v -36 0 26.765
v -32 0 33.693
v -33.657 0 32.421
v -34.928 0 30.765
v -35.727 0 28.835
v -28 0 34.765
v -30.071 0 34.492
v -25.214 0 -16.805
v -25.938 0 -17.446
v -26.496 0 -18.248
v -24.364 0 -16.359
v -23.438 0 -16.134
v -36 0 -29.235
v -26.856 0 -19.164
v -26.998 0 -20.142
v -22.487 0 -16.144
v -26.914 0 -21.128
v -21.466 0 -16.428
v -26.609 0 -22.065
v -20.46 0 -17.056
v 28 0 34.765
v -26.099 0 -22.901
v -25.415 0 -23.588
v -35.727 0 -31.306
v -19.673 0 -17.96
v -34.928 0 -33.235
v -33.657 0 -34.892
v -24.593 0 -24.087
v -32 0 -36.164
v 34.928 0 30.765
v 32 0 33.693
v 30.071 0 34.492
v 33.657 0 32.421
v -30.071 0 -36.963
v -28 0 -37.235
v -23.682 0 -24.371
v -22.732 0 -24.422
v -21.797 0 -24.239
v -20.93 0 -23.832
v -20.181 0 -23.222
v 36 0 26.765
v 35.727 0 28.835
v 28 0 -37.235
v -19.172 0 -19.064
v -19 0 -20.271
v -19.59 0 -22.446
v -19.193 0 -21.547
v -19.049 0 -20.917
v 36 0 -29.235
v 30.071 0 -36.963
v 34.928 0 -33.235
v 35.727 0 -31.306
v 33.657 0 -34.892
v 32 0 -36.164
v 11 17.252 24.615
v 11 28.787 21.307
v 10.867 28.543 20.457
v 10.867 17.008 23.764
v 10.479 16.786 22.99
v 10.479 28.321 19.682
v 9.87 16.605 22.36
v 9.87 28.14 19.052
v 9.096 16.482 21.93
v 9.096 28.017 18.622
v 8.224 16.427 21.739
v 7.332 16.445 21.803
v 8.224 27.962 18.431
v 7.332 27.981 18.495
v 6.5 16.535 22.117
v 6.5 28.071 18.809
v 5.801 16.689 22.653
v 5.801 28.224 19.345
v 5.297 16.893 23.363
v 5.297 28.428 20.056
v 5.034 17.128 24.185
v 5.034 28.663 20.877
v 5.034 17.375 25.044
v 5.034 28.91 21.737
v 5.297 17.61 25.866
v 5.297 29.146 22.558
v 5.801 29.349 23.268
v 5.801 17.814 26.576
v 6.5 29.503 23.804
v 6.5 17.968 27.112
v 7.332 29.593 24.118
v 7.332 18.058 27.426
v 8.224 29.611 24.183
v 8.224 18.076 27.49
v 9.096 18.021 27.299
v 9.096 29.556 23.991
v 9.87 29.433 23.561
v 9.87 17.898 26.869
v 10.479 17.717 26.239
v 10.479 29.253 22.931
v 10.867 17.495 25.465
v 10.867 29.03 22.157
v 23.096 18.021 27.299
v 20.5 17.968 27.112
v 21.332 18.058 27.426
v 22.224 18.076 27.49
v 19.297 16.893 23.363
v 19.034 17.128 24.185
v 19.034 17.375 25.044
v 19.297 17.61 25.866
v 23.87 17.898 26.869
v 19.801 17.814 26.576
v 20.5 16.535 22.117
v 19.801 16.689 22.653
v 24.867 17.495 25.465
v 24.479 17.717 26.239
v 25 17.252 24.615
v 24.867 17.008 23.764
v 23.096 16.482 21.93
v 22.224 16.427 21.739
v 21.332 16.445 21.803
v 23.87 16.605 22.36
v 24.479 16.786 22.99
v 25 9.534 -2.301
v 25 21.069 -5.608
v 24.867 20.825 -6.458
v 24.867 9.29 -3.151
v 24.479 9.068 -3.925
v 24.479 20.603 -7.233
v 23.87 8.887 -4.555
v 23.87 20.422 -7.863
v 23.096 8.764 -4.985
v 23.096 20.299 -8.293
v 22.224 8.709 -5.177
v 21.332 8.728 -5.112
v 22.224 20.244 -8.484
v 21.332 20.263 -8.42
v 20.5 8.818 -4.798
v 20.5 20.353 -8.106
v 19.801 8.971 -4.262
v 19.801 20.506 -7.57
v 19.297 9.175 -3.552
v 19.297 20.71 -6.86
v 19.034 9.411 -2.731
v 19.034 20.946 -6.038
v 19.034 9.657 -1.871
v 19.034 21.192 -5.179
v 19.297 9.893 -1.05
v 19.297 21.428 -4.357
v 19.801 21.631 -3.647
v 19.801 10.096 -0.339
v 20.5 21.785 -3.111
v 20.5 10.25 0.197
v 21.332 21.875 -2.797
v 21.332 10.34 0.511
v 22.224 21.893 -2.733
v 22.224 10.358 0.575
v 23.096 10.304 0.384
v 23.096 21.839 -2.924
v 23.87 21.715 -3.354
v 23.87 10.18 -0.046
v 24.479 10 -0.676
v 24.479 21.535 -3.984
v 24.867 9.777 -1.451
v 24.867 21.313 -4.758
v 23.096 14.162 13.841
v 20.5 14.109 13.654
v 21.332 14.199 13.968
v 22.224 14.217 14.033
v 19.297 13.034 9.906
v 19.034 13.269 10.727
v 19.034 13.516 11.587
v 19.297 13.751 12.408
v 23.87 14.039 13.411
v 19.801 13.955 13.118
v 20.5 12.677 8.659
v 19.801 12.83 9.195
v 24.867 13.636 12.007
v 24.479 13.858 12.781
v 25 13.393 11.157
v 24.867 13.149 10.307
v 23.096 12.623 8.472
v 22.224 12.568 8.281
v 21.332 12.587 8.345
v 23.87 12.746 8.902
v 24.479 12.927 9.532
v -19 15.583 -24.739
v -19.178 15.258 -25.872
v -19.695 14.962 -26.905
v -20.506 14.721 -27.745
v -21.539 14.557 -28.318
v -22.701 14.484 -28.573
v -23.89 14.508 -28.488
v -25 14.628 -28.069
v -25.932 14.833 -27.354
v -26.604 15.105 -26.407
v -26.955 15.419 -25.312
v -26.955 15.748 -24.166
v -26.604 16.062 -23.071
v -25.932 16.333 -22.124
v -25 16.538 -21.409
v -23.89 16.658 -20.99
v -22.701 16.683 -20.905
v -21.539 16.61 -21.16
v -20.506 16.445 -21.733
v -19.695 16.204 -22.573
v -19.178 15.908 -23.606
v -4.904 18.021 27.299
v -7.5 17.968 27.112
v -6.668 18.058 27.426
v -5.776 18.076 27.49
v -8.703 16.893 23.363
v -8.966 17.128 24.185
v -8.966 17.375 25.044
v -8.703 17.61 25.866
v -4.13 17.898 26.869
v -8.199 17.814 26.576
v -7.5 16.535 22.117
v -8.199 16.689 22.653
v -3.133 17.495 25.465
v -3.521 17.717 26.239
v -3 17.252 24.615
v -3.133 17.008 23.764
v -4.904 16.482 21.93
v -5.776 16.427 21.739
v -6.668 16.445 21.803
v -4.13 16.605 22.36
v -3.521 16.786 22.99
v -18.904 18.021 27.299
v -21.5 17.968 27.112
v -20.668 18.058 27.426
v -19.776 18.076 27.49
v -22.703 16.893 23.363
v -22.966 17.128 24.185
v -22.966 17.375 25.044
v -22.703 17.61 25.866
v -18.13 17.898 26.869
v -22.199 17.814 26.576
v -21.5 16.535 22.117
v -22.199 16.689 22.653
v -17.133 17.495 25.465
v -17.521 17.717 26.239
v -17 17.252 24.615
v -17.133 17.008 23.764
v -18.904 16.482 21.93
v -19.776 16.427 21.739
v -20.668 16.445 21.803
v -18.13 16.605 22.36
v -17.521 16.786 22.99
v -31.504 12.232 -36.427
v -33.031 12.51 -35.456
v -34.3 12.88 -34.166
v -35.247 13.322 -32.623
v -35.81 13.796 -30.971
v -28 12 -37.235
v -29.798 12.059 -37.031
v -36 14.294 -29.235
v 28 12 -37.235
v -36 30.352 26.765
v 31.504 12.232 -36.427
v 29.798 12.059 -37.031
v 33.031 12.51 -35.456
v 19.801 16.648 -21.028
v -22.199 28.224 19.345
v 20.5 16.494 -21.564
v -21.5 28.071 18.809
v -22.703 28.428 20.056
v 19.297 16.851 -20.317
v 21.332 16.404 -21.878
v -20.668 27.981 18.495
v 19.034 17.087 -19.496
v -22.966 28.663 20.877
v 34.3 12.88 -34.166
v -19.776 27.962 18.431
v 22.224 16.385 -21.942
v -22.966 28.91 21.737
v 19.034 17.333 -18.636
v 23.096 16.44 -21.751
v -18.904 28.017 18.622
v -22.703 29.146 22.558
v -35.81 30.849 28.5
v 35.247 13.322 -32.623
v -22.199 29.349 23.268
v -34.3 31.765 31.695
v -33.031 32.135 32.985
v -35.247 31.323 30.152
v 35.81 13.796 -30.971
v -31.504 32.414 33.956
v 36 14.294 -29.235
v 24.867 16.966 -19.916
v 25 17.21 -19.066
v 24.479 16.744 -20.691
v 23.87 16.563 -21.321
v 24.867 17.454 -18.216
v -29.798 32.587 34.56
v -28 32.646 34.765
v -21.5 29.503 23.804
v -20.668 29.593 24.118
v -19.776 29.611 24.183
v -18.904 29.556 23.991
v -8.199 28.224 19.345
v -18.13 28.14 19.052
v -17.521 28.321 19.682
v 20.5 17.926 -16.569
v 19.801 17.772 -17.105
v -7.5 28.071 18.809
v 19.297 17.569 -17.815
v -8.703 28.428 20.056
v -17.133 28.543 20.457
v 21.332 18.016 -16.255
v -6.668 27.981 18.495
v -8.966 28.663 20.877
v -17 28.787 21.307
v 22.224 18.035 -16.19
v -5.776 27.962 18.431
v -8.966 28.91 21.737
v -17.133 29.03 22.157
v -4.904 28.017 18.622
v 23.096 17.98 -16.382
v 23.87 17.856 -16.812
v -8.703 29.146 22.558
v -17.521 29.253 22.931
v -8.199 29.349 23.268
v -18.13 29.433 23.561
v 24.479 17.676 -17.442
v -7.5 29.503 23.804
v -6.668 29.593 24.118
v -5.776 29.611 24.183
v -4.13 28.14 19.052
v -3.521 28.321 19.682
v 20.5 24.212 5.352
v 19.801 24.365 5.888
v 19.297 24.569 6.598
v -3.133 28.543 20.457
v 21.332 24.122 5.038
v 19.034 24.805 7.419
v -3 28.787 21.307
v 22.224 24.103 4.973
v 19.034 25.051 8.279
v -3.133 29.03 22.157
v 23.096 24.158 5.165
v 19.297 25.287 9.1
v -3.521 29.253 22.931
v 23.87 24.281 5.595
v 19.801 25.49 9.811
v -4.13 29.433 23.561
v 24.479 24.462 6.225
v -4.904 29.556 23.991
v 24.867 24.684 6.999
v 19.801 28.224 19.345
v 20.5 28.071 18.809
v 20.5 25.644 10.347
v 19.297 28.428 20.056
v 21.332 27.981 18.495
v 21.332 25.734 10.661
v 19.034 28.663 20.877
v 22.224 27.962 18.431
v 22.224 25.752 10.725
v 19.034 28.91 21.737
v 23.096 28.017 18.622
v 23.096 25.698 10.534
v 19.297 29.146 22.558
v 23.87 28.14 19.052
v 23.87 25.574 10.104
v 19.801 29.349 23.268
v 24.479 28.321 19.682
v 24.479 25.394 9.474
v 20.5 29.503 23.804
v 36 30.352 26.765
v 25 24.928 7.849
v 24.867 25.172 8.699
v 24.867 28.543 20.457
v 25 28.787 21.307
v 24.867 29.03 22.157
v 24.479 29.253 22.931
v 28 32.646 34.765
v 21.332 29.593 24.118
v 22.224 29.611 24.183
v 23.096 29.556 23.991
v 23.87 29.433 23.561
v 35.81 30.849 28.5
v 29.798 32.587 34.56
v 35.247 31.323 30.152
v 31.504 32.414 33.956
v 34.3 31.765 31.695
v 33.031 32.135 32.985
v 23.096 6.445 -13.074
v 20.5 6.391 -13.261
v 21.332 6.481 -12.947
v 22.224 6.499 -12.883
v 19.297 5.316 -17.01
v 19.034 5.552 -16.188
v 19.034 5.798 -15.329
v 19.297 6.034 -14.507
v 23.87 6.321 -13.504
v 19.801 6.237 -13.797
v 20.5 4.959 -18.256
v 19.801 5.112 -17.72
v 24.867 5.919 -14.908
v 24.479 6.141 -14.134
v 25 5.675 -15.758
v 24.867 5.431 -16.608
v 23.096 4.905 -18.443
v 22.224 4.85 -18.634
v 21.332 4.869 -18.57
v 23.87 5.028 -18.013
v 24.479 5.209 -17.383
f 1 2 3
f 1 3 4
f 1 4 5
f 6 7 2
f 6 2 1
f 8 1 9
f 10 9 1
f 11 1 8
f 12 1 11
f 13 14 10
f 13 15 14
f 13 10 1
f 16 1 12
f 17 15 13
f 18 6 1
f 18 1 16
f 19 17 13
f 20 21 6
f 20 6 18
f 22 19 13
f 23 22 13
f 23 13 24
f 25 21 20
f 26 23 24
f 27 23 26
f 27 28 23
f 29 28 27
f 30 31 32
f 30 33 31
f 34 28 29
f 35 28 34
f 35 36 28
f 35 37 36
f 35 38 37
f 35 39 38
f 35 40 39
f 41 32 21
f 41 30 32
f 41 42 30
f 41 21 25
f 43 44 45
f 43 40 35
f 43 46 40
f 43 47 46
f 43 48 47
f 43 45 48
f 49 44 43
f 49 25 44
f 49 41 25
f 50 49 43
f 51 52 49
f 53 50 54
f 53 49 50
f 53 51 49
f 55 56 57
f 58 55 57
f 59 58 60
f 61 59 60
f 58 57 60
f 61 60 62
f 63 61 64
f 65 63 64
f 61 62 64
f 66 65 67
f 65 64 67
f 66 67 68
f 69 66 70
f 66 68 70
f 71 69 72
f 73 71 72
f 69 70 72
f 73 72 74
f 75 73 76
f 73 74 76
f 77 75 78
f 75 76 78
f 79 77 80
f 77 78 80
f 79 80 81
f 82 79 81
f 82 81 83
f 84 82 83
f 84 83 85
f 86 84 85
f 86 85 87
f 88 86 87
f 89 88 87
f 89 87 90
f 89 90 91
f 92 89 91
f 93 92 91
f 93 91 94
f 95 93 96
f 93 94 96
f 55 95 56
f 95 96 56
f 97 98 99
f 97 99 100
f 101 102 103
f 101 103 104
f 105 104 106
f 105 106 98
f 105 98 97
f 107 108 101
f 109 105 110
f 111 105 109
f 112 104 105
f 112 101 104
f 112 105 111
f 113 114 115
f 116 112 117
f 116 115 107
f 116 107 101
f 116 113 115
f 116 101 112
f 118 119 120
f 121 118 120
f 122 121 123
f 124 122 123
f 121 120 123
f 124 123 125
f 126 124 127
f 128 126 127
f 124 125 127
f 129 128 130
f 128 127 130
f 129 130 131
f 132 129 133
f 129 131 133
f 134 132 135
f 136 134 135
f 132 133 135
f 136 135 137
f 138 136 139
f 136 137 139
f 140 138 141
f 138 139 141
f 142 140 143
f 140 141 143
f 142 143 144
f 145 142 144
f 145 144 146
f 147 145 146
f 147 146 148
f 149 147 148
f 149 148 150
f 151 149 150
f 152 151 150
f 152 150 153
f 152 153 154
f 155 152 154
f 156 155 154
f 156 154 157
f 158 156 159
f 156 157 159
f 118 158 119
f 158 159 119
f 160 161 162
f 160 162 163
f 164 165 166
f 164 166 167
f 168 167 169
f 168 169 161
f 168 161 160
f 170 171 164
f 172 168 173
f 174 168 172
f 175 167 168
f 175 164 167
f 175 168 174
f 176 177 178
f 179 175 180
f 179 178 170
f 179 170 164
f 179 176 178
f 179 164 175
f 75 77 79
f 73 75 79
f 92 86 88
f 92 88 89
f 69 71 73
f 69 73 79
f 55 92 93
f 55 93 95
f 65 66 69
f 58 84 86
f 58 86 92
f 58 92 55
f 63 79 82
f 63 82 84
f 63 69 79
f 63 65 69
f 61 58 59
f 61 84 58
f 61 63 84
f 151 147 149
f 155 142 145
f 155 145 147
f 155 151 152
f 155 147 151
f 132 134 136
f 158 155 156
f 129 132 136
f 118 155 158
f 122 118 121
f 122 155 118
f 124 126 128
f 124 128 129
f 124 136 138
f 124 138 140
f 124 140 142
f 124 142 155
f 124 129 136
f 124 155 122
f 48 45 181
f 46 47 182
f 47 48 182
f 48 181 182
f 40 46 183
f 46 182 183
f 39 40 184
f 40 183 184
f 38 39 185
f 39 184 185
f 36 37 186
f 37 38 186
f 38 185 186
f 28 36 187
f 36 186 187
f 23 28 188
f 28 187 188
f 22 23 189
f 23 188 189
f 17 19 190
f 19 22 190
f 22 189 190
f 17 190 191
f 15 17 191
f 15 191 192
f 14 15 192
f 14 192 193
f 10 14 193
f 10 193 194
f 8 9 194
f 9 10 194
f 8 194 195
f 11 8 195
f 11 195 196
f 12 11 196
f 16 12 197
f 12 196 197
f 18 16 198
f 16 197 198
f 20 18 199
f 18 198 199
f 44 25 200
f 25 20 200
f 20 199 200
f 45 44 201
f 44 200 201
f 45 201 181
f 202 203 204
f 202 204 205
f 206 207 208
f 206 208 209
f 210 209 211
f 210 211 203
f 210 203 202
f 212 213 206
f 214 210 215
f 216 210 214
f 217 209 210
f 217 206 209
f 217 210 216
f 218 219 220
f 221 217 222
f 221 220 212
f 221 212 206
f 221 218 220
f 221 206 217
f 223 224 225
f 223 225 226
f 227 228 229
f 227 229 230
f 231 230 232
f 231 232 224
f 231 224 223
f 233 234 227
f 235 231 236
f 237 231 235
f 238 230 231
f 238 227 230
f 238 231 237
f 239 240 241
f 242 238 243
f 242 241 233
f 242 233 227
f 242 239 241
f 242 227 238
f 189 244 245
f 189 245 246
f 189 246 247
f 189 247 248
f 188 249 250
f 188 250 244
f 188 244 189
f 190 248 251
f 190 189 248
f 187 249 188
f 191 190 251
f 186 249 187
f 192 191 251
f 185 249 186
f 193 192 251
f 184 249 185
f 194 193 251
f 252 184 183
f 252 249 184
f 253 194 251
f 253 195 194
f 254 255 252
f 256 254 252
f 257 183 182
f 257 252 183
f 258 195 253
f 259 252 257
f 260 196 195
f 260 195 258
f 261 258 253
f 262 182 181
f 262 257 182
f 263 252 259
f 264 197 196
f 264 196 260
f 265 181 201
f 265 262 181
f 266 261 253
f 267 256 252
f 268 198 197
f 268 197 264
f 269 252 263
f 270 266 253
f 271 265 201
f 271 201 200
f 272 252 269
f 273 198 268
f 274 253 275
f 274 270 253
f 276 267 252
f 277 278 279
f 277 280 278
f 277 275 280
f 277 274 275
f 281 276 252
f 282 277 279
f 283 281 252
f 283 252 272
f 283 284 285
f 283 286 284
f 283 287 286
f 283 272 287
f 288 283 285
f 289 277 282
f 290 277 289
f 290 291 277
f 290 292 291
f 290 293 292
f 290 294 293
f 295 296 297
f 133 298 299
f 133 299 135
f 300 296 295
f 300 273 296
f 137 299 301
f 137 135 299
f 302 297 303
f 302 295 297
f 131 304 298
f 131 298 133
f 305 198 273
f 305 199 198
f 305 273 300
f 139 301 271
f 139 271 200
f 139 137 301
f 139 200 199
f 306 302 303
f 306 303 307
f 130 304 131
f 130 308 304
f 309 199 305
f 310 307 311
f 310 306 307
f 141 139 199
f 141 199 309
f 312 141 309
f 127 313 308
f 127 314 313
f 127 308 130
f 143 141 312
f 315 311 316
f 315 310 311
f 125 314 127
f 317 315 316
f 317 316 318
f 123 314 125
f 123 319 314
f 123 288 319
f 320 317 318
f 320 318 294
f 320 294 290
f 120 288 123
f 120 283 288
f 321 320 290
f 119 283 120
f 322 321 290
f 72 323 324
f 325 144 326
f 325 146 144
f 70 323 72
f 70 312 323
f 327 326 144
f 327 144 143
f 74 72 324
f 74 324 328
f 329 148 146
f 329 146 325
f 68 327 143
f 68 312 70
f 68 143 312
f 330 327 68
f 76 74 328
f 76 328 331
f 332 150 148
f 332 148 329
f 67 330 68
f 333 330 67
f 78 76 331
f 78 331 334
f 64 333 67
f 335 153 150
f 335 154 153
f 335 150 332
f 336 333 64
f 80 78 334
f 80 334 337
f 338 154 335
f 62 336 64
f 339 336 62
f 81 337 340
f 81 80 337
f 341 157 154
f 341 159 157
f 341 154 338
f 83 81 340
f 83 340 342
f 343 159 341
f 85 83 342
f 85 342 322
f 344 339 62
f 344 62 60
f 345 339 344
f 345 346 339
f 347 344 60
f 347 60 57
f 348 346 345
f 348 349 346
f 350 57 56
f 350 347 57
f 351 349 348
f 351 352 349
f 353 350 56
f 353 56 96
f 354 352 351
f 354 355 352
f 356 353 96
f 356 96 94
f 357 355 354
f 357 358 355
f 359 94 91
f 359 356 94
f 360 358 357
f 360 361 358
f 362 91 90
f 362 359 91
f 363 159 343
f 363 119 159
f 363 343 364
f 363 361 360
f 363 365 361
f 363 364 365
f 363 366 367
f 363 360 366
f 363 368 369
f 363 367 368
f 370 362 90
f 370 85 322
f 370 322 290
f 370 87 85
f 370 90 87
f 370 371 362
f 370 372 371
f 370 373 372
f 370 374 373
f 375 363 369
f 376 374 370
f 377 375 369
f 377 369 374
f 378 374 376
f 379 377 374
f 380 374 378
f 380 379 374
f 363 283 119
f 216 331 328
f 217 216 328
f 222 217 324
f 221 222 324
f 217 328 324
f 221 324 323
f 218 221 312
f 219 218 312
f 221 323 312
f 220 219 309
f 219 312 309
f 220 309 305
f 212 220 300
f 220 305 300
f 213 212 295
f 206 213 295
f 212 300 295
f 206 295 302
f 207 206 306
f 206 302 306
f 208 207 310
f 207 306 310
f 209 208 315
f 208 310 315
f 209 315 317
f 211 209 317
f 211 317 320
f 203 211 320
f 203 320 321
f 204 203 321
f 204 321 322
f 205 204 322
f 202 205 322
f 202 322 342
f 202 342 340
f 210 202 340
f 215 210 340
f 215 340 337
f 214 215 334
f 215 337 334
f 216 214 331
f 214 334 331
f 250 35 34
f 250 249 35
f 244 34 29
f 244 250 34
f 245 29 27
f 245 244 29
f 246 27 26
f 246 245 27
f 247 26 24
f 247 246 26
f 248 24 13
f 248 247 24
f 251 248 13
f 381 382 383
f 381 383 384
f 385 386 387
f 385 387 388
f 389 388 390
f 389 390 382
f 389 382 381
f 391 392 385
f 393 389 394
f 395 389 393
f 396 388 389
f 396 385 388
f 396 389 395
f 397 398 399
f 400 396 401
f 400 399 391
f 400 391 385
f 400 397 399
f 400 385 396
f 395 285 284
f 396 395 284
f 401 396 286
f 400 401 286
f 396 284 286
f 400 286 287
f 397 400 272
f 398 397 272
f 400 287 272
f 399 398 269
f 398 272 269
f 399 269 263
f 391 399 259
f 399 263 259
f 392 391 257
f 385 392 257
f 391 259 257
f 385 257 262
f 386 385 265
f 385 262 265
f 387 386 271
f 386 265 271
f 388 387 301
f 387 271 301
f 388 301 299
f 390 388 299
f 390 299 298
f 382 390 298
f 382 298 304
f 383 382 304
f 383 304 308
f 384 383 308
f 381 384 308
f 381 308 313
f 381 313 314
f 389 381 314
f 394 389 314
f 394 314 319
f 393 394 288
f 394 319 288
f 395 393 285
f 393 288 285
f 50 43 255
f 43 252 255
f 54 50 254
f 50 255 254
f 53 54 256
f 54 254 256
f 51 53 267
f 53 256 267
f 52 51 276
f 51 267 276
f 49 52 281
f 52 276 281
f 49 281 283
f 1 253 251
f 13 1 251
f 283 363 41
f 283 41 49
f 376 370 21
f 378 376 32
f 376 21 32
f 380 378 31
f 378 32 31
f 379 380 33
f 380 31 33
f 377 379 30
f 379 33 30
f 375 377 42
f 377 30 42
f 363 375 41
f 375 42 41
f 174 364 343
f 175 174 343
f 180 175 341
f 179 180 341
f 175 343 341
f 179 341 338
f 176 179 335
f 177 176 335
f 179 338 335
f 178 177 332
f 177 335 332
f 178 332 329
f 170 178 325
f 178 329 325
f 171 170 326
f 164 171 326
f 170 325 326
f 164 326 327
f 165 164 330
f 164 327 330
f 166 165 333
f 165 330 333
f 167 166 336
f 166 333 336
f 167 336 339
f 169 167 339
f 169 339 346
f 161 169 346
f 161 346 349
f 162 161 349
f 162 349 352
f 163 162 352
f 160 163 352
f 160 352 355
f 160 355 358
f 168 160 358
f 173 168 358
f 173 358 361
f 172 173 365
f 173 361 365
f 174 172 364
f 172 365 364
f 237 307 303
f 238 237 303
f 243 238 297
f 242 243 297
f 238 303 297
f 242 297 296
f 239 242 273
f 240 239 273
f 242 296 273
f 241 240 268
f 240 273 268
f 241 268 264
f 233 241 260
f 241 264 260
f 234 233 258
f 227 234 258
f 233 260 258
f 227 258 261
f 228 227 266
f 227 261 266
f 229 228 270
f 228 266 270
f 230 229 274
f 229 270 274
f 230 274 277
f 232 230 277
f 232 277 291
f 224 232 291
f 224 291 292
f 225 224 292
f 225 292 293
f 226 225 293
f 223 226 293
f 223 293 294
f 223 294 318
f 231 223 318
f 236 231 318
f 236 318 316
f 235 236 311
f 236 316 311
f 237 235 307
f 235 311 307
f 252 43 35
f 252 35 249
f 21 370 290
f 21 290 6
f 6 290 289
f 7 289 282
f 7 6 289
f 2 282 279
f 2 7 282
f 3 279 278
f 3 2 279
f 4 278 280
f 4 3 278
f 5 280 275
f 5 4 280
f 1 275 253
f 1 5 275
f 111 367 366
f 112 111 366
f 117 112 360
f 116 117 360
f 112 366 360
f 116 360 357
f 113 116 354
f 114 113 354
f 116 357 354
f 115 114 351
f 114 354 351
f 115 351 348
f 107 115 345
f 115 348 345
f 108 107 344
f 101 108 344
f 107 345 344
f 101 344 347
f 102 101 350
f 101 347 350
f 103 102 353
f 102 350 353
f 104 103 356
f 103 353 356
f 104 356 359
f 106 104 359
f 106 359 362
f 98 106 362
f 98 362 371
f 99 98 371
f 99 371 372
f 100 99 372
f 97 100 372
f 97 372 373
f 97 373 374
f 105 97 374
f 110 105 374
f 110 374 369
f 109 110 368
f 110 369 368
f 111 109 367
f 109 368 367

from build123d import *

# Parameters (mm, degrees)
BOSS_EXTRUDE1_DEPTH = 36
FILLET2_R           = 8
SKETCH4_R           = 4
CUT_EXTRUDE2_DEPTH  = 32.38102997
SKETCH3_R           = 3
CUT_EXTRUDE3_DEPTH  = 12


with BuildPart() as part:
    # Sketch2 → Boss-Extrude1 (new body, symmetric)
    with BuildSketch(Plane(origin=(0, 0, 0), x_dir=(0, 0, -1), z_dir=(1, 0, 0))):
        Polygon((37.235479123, 0), (37.235479123, 12), (-34.764520877, 32.645667775), (-34.764520877, 0), align=None)
    extrude(amount=BOSS_EXTRUDE1_DEPTH, both=True)

    # Fillet2
    fillet2_edges = [part.edges().sort_by_distance(p)[0] for p in [
        (36, 6, -37.235479123),
        (-36, 6, -37.235479123),
        (-36, 16.322833887, 34.764520877),
        (36, 16.322833887, 34.764520877),
    ]]
    fillet(fillet2_edges, radius=FILLET2_R)

    # Sketch4 → Cut-Extrude2 (cut, through all)
    with BuildSketch(Plane(origin=(0, 20.954187427, -6.008516557), x_dir=(1, 0, 0), z_dir=(0, 0.961261696, -0.275637356))):
        with Locations((-23, 19.485391541)):
            Circle(SKETCH4_R)
    extrude(amount=-CUT_EXTRUDE2_DEPTH, mode=Mode.SUBTRACT)

    # Sketch3 → Cut-Extrude3 (cut)
    with BuildSketch(Plane(origin=(0, 20.954187427, -6.008516557), x_dir=(1, 0, 0), z_dir=(0, 0.961261696, -0.275637356))):
        with Locations((-20, -28.416167841)):
            Circle(SKETCH3_R)
        with Locations((-6, -28.416167841)):
            Circle(SKETCH3_R)
        with Locations((8, -28.416167841)):
            Circle(SKETCH3_R)
        with Locations((22, -28.416167841)):
            Circle(SKETCH3_R)
        with Locations((22, -14.416167841)):
            Circle(SKETCH3_R)
        with Locations((22, -0.416167841)):
            Circle(SKETCH3_R)
        with Locations((22, 13.583832159)):
            Circle(SKETCH3_R)
    extrude(amount=-CUT_EXTRUDE3_DEPTH, mode=Mode.SUBTRACT)


solid = part.part
